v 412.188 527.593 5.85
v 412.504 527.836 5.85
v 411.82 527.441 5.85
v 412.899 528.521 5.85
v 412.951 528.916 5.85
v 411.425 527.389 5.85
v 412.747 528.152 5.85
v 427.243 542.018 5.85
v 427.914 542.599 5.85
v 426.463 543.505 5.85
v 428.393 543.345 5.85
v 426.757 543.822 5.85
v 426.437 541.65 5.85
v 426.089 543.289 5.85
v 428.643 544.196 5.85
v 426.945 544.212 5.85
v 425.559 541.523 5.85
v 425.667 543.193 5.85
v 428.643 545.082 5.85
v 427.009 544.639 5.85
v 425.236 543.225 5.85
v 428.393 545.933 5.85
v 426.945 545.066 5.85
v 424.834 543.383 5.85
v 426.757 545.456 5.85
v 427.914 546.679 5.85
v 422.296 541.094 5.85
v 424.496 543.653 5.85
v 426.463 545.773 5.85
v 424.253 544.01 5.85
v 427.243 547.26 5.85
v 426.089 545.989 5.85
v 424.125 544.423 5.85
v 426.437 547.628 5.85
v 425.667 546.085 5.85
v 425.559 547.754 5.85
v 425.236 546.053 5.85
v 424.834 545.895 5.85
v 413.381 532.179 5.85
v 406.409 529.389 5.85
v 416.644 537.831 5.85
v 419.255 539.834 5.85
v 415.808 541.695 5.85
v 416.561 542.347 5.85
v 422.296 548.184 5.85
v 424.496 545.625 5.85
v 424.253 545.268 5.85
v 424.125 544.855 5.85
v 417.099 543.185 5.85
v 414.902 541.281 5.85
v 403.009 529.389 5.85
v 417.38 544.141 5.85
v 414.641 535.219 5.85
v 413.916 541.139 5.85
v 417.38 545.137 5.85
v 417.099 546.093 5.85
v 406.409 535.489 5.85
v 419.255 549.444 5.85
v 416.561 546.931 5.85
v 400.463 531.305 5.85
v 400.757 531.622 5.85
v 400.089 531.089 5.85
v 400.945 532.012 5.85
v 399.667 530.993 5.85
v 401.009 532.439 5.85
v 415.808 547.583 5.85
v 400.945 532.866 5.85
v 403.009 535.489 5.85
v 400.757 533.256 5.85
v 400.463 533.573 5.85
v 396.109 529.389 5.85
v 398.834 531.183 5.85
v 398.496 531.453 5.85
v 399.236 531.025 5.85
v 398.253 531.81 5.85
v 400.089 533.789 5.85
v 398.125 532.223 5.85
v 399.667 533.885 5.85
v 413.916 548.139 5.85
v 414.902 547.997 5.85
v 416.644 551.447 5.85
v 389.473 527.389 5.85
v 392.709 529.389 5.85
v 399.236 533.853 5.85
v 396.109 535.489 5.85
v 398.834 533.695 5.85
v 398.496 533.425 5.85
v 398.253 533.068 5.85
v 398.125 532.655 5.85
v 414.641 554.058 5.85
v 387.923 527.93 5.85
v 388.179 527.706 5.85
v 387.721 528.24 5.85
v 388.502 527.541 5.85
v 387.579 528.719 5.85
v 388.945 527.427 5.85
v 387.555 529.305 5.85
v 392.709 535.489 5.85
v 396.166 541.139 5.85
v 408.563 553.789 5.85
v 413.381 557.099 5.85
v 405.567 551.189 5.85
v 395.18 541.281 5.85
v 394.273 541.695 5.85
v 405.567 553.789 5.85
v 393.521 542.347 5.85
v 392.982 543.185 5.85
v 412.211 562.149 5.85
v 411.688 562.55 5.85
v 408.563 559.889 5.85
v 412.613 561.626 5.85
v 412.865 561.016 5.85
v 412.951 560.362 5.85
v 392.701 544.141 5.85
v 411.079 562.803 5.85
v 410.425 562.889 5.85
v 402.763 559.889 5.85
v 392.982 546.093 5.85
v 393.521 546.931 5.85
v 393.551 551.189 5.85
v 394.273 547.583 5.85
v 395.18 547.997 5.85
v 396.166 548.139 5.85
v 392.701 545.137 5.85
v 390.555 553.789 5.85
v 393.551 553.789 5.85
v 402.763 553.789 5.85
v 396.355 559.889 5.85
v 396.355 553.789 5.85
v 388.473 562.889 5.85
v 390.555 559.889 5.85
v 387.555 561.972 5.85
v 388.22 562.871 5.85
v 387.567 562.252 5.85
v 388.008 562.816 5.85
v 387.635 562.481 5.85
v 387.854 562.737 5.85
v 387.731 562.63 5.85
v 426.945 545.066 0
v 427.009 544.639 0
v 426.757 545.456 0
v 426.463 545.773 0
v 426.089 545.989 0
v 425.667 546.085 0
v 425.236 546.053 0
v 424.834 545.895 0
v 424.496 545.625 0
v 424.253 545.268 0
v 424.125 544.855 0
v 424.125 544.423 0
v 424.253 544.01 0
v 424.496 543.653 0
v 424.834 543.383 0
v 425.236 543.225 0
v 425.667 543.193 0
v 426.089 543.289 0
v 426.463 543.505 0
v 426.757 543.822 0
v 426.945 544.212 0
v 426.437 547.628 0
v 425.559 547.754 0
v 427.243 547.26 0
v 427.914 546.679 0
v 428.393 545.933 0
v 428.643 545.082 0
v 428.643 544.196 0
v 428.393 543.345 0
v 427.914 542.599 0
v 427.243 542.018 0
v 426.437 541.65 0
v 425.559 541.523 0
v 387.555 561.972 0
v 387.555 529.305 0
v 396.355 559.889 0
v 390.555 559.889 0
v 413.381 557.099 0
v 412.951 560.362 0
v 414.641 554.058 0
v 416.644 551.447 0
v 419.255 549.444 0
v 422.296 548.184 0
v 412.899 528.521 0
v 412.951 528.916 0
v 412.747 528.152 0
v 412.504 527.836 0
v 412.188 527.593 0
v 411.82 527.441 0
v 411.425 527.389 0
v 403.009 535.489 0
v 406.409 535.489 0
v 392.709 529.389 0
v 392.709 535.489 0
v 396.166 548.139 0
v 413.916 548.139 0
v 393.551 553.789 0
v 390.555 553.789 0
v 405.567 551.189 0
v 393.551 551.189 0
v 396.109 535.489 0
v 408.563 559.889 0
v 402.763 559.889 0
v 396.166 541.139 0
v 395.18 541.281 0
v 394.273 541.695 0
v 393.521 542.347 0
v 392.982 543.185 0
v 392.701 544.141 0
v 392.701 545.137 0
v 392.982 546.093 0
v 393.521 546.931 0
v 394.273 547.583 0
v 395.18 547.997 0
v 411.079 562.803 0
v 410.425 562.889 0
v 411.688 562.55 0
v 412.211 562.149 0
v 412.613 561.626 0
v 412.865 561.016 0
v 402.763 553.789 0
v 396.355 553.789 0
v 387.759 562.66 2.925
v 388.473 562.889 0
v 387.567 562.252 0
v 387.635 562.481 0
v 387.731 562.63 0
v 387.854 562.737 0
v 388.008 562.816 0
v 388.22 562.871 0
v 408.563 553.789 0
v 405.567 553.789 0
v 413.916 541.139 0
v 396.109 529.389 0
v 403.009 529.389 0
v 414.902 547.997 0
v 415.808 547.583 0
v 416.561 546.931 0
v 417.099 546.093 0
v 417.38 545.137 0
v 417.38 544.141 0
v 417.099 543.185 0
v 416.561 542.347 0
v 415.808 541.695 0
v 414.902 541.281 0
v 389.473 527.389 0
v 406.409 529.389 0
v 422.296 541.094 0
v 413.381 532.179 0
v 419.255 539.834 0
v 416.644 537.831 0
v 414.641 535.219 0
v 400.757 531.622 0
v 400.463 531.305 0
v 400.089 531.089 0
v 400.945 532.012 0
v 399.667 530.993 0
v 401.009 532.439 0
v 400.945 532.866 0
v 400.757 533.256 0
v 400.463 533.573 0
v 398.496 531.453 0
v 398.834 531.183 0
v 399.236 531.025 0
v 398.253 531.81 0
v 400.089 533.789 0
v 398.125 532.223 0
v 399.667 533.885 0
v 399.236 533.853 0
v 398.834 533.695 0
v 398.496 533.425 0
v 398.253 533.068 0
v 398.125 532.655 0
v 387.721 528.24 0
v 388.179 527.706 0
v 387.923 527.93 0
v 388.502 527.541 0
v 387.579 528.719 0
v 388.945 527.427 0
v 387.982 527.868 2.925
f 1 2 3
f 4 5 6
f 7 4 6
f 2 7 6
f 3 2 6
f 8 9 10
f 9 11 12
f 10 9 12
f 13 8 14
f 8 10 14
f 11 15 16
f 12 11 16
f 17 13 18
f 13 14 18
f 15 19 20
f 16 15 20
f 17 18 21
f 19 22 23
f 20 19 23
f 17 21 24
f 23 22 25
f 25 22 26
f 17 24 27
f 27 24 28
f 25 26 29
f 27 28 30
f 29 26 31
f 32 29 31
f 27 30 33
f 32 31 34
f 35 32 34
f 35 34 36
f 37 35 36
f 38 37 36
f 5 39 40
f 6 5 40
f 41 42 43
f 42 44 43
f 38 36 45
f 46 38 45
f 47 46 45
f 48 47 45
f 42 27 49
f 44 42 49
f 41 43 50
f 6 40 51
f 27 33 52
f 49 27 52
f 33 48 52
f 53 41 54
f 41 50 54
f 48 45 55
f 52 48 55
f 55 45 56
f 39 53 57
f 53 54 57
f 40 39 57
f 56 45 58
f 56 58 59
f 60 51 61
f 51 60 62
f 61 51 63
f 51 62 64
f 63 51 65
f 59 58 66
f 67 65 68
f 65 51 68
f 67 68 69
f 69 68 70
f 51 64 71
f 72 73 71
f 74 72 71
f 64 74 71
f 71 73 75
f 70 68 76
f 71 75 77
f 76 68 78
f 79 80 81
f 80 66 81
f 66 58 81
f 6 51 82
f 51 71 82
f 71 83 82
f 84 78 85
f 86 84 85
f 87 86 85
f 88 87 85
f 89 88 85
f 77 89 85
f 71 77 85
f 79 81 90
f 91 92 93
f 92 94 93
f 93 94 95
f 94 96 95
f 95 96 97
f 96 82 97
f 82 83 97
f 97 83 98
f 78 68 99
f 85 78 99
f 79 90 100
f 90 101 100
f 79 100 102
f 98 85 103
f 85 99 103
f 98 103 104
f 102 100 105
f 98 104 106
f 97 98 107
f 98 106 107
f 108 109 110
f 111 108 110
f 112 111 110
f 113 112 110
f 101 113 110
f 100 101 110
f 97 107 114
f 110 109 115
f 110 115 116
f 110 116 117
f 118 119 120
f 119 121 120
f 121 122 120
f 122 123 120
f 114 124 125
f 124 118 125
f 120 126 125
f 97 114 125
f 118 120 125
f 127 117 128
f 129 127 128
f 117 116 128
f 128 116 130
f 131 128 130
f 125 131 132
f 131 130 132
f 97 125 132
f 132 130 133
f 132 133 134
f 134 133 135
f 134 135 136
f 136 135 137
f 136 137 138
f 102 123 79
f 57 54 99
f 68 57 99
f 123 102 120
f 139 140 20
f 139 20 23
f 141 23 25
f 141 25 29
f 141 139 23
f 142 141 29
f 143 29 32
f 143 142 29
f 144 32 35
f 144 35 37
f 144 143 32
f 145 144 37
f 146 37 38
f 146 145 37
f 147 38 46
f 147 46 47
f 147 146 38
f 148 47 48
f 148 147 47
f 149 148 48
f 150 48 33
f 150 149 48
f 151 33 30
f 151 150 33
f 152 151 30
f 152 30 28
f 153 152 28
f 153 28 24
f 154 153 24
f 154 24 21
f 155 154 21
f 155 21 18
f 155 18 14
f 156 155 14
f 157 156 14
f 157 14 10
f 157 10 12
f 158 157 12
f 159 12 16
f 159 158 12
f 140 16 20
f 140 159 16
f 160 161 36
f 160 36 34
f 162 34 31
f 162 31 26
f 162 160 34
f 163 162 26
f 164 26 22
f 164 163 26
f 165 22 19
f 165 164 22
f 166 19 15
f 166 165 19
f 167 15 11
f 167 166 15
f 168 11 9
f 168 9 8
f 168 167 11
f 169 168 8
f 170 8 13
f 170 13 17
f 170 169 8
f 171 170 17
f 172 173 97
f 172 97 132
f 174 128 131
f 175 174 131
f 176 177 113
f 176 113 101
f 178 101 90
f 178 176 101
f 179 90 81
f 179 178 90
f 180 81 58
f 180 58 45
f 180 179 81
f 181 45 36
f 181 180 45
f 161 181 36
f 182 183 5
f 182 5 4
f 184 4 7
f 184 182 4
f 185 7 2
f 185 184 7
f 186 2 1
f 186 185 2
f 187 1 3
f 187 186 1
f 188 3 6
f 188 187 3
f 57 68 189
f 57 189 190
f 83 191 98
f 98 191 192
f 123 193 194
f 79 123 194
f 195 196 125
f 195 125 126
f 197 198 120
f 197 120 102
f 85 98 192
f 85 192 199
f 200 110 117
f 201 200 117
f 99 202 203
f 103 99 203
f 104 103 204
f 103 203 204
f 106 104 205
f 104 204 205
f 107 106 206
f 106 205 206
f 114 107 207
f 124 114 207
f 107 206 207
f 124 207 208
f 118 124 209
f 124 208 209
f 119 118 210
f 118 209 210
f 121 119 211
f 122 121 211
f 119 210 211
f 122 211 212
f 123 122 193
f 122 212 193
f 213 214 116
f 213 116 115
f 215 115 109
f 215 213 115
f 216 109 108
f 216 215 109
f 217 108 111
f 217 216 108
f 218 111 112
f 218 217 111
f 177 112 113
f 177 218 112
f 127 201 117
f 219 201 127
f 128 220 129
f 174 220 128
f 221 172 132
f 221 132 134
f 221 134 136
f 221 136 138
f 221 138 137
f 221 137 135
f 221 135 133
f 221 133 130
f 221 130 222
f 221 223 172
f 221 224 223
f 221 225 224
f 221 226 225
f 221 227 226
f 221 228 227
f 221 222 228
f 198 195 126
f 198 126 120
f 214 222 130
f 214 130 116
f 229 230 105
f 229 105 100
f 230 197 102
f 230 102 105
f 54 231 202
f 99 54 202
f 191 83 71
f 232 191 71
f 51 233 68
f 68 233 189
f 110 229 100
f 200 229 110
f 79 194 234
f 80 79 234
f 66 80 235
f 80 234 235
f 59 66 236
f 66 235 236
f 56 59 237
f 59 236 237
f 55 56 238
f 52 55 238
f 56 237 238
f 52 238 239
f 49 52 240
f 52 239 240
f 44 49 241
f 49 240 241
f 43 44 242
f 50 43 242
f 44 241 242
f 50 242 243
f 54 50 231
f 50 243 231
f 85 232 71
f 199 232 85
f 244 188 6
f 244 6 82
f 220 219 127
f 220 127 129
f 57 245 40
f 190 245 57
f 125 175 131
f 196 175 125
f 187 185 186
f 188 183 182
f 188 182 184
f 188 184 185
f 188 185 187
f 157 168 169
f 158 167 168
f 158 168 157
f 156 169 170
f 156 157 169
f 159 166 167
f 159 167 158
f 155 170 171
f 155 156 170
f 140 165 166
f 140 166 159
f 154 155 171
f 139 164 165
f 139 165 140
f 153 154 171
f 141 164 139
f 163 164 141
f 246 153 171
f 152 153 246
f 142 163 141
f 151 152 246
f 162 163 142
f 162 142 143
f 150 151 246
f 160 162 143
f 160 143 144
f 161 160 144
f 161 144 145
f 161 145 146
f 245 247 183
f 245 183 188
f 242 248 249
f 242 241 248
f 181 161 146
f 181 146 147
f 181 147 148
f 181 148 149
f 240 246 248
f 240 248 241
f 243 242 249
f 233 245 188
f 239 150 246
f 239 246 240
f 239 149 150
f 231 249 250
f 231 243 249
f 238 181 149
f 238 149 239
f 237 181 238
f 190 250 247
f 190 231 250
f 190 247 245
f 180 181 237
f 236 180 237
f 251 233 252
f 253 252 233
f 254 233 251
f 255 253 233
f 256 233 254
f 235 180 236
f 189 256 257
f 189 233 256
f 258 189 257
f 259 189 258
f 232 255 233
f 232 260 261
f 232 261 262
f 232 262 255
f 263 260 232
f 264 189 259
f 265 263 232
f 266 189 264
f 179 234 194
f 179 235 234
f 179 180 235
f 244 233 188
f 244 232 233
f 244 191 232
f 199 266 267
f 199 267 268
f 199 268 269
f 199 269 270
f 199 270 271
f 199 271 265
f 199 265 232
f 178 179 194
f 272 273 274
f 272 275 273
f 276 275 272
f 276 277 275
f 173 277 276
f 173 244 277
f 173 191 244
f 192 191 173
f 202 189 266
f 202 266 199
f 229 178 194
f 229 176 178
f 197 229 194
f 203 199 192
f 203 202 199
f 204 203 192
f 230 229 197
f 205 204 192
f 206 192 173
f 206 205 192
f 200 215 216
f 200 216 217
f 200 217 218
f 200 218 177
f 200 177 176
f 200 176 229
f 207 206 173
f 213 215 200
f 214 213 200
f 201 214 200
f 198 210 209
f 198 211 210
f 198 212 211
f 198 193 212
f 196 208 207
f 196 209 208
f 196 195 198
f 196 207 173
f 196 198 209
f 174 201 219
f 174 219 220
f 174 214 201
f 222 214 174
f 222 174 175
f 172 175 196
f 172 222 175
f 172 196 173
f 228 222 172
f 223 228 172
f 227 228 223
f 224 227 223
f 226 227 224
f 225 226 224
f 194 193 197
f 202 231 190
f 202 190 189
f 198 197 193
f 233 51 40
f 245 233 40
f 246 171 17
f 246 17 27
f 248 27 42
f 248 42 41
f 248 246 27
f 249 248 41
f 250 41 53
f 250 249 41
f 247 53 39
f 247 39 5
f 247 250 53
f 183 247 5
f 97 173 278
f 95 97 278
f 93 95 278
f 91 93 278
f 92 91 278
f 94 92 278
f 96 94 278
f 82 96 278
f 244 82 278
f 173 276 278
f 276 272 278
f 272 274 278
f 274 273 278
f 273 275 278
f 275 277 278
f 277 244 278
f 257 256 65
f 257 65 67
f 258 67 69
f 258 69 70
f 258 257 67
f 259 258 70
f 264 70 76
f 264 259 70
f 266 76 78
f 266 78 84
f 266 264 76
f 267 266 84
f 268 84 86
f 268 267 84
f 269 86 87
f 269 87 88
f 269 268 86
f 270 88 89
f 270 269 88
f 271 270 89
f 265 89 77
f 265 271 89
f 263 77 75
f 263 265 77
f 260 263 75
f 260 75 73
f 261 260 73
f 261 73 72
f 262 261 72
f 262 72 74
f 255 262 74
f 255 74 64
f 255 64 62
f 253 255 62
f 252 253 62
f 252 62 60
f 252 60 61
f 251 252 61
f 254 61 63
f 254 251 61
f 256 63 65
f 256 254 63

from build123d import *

# Parameters (mm, degrees)
SKETCH1_R           = 1.45
SKETCH1_W           = 3.400011
SKETCH1_H           = 6.1
BOSS_EXTRUDE2_DEPTH = 5.85


with BuildPart() as part:
    # Sketch1 → Boss-Extrude2 (new body)
    with BuildSketch(Plane.XY):
        with BuildLine():
            Line((388.472923735, 562.888903138), (410.424633118, 562.888903138))
            ThreePointArc((410.424633118, 562.888903138), (412.211329852, 562.148829119), (412.95140387, 560.362132386))
            ThreePointArc((412.95140387, 560.362132386), (416.644097047, 551.447182437), (425.559046996, 547.75448926))
            ThreePointArc((425.559046996, 547.75448926), (428.674633119, 544.638903138), (425.559046996, 541.523317015))
            ThreePointArc((425.559046996, 541.523317015), (416.644097047, 537.830623838), (412.95140387, 528.915673889))
            ThreePointArc((412.95140387, 528.915673889), (412.50422307, 527.836083937), (411.424633118, 527.388903138))
            Line((411.424633118, 527.388903138), (389.472923735, 527.388903138))
            add(Edge.make_bspline(
                [(387.555122745, 529.304742909), (387.449571593, 527.388903138), (389.472923735, 527.388903138)],
                knots=[0, 0, 0, 1, 1, 1], degree=2))
            Line((387.555122745, 529.304742909), (387.555122745, 561.972040272))
            add(Edge.make_bspline(
                [(387.555122745, 561.972040272), (387.504608679, 562.888903138), (388.472923735, 562.888903138)],
                knots=[0, 0, 0, 1, 1, 1], degree=2))
        make_face()
        with Locations((425.559046996, 544.638903138)):
            Circle(SKETCH1_R, mode=Mode.SUBTRACT)
        with Locations((399.559046996, 532.438903138)):
            Circle(SKETCH1_R, mode=Mode.SUBTRACT)
        Polygon((405.566920996, 551.188903138), (405.566920996, 553.788903138), (408.562971247, 553.788903138), (408.562971247, 559.888903138), (402.762971247, 559.888903138), (402.762971247, 553.788903138), (396.355122745, 553.788903138), (396.355122745, 559.888903138), (390.555122745, 559.888903138), (390.555122745, 553.788903138), (393.551172996, 553.788903138), (393.551172996, 551.188903138), align=None, mode=Mode.SUBTRACT)
        with Locations((394.409041496, 532.438903138)):
            Rectangle(SKETCH1_W, SKETCH1_H, mode=Mode.SUBTRACT)
        with Locations((404.709052496, 532.438903138)):
            Rectangle(SKETCH1_W, SKETCH1_H, mode=Mode.SUBTRACT)
        with BuildLine():
            Line((396.165690223, 548.138903138), (413.915690223, 548.138903138))
            ThreePointArc((413.915690223, 548.138903138), (417.415690223, 544.638903138), (413.915690223, 541.138903138))
            Line((413.915690223, 541.138903138), (396.165690223, 541.138903138))
            ThreePointArc((396.165690223, 541.138903138), (392.665690223, 544.638903138), (396.165690223, 548.138903138))
        make_face(mode=Mode.SUBTRACT)
    extrude(amount=BOSS_EXTRUDE2_DEPTH)


solid = part.part
